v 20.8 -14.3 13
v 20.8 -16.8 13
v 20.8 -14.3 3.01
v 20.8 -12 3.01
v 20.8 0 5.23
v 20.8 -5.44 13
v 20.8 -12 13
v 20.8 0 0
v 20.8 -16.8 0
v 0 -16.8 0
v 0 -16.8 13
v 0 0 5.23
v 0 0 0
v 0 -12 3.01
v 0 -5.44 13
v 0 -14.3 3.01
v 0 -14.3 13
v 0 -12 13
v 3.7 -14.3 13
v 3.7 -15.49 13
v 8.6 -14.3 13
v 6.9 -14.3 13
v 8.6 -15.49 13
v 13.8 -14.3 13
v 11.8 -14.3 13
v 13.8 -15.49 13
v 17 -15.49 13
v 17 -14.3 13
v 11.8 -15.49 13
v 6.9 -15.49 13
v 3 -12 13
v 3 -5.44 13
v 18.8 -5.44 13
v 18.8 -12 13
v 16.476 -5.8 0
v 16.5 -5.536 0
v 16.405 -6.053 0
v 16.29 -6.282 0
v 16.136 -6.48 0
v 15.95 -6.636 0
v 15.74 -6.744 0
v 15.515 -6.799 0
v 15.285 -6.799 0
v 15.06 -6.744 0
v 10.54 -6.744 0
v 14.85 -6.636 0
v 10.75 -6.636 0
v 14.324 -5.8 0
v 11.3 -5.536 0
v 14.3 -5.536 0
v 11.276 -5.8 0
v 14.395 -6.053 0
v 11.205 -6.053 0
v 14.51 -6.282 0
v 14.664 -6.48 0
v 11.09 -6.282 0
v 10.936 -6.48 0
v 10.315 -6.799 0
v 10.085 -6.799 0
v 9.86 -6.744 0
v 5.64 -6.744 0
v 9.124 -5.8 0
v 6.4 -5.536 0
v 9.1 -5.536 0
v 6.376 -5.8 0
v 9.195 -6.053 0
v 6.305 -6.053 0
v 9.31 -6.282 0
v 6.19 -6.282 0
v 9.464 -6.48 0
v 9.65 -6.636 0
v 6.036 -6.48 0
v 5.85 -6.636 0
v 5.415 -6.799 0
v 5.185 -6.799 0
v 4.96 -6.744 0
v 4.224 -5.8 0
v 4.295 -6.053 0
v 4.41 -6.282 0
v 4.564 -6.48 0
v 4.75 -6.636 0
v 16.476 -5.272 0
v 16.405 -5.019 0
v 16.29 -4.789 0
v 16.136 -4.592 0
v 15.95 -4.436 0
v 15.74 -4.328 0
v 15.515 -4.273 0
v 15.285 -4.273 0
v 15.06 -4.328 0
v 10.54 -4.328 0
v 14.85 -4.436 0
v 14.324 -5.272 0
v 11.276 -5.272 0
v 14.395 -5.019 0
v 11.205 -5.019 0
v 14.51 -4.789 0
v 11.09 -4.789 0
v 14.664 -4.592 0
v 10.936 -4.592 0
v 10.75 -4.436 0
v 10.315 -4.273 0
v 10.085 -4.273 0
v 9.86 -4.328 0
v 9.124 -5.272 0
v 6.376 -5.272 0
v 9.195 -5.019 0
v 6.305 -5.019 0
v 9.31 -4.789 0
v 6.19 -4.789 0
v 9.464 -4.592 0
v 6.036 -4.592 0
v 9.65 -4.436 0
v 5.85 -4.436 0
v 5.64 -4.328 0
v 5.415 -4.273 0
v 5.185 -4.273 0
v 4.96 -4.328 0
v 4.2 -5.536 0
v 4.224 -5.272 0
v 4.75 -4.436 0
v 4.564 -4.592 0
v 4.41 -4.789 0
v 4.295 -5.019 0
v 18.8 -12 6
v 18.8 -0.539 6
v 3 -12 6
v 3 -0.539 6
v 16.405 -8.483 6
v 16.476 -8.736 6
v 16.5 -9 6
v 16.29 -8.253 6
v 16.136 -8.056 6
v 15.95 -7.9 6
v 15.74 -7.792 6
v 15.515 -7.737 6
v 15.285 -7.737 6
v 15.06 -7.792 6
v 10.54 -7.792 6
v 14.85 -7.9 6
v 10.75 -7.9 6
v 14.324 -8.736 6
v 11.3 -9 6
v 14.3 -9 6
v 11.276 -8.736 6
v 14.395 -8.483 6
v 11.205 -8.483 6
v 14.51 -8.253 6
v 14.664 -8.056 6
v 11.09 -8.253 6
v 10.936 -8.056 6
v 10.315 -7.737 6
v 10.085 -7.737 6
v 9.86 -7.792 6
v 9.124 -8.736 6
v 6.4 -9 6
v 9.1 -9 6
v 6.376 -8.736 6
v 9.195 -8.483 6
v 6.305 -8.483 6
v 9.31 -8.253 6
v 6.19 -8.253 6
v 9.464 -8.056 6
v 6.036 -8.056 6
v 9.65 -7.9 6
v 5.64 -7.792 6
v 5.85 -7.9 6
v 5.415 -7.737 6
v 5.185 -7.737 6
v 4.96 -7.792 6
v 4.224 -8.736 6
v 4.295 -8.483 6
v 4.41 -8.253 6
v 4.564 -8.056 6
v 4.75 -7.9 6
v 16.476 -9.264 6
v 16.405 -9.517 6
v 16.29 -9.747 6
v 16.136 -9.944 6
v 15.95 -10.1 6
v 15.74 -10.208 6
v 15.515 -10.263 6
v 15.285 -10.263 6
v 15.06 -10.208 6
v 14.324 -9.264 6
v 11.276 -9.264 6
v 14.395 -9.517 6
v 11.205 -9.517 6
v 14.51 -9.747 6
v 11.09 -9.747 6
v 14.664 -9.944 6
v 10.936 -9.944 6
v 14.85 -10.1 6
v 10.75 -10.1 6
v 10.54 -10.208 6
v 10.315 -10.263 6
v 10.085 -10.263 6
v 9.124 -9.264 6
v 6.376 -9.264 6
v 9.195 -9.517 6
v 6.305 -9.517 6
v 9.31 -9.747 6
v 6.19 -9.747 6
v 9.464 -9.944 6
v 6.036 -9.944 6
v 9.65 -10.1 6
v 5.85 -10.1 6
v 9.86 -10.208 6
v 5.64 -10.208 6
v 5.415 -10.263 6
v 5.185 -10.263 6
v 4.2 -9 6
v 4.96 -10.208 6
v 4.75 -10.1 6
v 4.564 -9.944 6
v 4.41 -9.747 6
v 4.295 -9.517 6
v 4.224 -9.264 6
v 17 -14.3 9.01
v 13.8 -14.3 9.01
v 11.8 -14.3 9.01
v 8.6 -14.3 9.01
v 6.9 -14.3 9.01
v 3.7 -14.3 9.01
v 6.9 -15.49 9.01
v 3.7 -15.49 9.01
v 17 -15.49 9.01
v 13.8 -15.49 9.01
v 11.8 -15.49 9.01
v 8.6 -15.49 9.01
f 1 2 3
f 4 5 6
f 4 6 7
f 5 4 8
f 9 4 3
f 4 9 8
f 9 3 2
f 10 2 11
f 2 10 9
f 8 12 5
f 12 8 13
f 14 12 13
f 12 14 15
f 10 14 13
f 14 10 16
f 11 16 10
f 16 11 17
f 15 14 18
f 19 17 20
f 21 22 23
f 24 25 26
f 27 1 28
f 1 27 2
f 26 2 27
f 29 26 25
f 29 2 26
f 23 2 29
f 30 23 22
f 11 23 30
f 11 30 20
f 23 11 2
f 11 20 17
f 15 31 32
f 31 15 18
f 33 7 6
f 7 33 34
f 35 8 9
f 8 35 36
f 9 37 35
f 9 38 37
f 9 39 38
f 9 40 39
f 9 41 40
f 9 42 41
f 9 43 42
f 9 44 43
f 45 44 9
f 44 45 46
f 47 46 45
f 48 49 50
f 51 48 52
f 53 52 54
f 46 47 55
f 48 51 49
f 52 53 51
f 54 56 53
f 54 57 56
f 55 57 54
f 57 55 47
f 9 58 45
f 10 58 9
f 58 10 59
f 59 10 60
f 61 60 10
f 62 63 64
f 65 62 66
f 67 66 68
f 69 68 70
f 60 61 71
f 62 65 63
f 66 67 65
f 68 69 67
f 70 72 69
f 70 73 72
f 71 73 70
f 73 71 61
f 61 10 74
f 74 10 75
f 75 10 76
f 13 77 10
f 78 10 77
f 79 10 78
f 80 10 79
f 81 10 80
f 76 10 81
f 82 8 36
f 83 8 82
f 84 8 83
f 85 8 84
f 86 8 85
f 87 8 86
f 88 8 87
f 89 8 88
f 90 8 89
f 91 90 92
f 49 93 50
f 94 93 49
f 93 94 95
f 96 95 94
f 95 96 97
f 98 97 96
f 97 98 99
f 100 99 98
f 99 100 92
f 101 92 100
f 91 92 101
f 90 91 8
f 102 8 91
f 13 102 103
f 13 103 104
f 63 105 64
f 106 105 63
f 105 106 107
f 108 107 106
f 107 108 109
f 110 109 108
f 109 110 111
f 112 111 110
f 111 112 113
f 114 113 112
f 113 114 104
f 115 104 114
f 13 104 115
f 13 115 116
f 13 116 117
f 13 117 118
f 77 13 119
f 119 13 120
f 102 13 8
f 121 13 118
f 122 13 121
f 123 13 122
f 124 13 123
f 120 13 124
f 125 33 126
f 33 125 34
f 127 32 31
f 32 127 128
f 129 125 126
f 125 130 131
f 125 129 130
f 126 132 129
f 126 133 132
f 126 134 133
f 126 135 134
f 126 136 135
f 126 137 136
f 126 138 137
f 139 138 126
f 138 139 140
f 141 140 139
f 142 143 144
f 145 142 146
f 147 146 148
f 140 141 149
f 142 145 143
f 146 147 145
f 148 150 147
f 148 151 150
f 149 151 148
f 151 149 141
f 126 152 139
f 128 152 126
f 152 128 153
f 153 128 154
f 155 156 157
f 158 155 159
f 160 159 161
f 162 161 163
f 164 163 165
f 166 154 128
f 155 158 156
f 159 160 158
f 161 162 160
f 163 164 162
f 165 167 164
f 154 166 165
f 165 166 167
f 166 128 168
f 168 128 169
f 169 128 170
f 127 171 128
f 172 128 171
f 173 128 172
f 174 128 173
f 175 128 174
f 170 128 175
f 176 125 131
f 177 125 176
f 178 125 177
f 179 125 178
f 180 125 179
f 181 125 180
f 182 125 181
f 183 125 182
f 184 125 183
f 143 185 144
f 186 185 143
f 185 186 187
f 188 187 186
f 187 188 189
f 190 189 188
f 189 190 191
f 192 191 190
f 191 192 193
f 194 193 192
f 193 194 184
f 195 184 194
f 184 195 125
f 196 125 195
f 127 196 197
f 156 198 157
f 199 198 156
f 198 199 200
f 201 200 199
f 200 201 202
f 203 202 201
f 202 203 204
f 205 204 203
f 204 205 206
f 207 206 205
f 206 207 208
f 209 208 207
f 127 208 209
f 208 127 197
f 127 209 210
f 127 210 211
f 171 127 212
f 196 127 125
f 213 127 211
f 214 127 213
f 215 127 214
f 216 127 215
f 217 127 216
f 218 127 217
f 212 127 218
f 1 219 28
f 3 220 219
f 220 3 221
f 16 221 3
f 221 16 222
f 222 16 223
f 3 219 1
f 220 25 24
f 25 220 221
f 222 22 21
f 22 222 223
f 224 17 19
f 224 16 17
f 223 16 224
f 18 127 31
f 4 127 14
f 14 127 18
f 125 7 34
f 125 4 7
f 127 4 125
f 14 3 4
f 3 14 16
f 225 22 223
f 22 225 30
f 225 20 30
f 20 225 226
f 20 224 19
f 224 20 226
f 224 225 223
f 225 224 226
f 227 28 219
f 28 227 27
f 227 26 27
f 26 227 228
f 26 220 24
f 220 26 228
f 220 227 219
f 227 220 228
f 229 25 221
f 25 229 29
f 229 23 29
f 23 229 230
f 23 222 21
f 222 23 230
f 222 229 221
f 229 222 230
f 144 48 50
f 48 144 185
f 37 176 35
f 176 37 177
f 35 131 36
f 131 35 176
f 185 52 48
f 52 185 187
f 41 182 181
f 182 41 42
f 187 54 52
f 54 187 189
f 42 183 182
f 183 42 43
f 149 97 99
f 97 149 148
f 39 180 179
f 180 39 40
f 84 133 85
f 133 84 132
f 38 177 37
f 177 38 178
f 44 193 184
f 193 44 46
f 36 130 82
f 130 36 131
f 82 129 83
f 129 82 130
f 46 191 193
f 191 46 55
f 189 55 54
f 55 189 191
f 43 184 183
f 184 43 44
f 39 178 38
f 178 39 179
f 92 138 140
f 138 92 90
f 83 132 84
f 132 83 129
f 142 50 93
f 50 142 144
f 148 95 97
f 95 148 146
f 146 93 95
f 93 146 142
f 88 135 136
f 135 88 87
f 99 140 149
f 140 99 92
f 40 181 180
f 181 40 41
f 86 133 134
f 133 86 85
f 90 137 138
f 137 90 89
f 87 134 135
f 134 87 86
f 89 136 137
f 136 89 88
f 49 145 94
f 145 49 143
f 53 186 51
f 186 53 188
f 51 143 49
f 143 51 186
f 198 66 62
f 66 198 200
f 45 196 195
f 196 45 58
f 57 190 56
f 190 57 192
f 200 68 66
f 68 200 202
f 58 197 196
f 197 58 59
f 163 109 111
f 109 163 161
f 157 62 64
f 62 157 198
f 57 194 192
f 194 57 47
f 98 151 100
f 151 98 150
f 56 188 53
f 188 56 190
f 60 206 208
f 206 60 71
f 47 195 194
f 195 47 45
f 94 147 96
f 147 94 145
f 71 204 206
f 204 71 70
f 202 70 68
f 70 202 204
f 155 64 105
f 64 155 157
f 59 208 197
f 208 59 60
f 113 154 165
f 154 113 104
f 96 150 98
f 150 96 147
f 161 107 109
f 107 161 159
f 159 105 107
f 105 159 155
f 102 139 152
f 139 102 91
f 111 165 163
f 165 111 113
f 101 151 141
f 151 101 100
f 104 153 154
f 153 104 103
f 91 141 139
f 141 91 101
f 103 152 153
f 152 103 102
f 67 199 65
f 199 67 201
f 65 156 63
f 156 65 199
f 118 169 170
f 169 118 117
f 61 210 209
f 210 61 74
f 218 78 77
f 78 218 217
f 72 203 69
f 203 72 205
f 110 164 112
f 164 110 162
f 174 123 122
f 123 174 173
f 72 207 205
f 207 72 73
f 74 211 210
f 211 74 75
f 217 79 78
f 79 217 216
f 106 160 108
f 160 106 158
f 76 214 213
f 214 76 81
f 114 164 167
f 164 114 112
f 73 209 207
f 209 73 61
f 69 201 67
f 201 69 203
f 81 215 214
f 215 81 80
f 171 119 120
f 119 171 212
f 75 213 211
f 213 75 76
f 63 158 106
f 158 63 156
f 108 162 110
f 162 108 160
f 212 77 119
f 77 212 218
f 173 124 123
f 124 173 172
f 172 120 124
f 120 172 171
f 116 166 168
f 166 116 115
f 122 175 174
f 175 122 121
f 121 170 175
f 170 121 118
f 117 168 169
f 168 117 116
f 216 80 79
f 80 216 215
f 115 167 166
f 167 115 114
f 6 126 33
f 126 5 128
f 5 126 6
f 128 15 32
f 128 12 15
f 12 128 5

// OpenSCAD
// Strain Relief for heated bed Powercable

EPS=0.01;
$fs=0.2;

// 3-way screw connector
ConWidth=15.8;

// Inset measured from right edge of Connector
ConPlusInset=12.4;
ConMinusInset=7.2;
ConEmptyInset=2.3;

RightOfConMaterial=2;
LeftOfConMaterial=3;
MaterialToCon=3;


ThicknessOfCircuitBoard=2.3;
MaterialThicknessOverBoard=2.5;
MaterialThicknessBelowBoard=12;

MaterialIntoBoard=10;
MaterialBeforeBoard=3;

WireRadius=1.1;

//----------------
totalWidth=LeftOfConMaterial+ConWidth+RightOfConMaterial;

module solderGap() {
    solderWidth=3.2;
    translate([-solderWidth/2,MaterialIntoBoard+MaterialBeforeBoard-4+EPS,
                 MaterialThicknessBelowBoard+ThicknessOfCircuitBoard-EPS])
        cube(size=[solderWidth,4,1.2]);
}

module wireHole() {
    rotate(120, [1,0,0]) translate([0,0,-5]) cylinder(h = 20, r=WireRadius);
}

module bevel() {
    rotate(-55, [1,0,0])
      translate([-EPS,MaterialBeforeBoard,0])
        cube(size=[totalWidth+10, MaterialIntoBoard+MaterialBeforeBoard+10, 90]);
}

module relief() {
    difference() {
        cube(size=[totalWidth,
               MaterialIntoBoard+MaterialBeforeBoard,
               MaterialThicknessBelowBoard+ThicknessOfCircuitBoard+MaterialThicknessOverBoard]);
        translate([LeftOfConMaterial,MaterialBeforeBoard+MaterialToCon,-EPS])
            cube(size=[ConWidth,MaterialIntoBoard+EPS,ThicknessOfCircuitBoard+MaterialThicknessBelowBoard]);
        translate([-EPS,MaterialBeforeBoard+EPS,MaterialThicknessBelowBoard])
            cube(size=[totalWidth+2*EPS,MaterialIntoBoard,ThicknessOfCircuitBoard]);
        translate([LeftOfConMaterial+ConEmptyInset,0,0]) solderGap();
        translate([LeftOfConMaterial+ConPlusInset,0,0]) solderGap();
        translate([LeftOfConMaterial+ConMinusInset,0,0]) solderGap();
        translate([LeftOfConMaterial+ConPlusInset,MaterialBeforeBoard+MaterialToCon,MaterialThicknessBelowBoard-3])
            wireHole();
        translate([LeftOfConMaterial+ConMinusInset,MaterialBeforeBoard+MaterialToCon,MaterialThicknessBelowBoard-3])
            wireHole();
        translate([LeftOfConMaterial+ConEmptyInset,MaterialBeforeBoard+MaterialToCon,MaterialThicknessBelowBoard-3])
            wireHole();
        bevel();
    }
}

rotate(90,[1,0,0]) relief();
